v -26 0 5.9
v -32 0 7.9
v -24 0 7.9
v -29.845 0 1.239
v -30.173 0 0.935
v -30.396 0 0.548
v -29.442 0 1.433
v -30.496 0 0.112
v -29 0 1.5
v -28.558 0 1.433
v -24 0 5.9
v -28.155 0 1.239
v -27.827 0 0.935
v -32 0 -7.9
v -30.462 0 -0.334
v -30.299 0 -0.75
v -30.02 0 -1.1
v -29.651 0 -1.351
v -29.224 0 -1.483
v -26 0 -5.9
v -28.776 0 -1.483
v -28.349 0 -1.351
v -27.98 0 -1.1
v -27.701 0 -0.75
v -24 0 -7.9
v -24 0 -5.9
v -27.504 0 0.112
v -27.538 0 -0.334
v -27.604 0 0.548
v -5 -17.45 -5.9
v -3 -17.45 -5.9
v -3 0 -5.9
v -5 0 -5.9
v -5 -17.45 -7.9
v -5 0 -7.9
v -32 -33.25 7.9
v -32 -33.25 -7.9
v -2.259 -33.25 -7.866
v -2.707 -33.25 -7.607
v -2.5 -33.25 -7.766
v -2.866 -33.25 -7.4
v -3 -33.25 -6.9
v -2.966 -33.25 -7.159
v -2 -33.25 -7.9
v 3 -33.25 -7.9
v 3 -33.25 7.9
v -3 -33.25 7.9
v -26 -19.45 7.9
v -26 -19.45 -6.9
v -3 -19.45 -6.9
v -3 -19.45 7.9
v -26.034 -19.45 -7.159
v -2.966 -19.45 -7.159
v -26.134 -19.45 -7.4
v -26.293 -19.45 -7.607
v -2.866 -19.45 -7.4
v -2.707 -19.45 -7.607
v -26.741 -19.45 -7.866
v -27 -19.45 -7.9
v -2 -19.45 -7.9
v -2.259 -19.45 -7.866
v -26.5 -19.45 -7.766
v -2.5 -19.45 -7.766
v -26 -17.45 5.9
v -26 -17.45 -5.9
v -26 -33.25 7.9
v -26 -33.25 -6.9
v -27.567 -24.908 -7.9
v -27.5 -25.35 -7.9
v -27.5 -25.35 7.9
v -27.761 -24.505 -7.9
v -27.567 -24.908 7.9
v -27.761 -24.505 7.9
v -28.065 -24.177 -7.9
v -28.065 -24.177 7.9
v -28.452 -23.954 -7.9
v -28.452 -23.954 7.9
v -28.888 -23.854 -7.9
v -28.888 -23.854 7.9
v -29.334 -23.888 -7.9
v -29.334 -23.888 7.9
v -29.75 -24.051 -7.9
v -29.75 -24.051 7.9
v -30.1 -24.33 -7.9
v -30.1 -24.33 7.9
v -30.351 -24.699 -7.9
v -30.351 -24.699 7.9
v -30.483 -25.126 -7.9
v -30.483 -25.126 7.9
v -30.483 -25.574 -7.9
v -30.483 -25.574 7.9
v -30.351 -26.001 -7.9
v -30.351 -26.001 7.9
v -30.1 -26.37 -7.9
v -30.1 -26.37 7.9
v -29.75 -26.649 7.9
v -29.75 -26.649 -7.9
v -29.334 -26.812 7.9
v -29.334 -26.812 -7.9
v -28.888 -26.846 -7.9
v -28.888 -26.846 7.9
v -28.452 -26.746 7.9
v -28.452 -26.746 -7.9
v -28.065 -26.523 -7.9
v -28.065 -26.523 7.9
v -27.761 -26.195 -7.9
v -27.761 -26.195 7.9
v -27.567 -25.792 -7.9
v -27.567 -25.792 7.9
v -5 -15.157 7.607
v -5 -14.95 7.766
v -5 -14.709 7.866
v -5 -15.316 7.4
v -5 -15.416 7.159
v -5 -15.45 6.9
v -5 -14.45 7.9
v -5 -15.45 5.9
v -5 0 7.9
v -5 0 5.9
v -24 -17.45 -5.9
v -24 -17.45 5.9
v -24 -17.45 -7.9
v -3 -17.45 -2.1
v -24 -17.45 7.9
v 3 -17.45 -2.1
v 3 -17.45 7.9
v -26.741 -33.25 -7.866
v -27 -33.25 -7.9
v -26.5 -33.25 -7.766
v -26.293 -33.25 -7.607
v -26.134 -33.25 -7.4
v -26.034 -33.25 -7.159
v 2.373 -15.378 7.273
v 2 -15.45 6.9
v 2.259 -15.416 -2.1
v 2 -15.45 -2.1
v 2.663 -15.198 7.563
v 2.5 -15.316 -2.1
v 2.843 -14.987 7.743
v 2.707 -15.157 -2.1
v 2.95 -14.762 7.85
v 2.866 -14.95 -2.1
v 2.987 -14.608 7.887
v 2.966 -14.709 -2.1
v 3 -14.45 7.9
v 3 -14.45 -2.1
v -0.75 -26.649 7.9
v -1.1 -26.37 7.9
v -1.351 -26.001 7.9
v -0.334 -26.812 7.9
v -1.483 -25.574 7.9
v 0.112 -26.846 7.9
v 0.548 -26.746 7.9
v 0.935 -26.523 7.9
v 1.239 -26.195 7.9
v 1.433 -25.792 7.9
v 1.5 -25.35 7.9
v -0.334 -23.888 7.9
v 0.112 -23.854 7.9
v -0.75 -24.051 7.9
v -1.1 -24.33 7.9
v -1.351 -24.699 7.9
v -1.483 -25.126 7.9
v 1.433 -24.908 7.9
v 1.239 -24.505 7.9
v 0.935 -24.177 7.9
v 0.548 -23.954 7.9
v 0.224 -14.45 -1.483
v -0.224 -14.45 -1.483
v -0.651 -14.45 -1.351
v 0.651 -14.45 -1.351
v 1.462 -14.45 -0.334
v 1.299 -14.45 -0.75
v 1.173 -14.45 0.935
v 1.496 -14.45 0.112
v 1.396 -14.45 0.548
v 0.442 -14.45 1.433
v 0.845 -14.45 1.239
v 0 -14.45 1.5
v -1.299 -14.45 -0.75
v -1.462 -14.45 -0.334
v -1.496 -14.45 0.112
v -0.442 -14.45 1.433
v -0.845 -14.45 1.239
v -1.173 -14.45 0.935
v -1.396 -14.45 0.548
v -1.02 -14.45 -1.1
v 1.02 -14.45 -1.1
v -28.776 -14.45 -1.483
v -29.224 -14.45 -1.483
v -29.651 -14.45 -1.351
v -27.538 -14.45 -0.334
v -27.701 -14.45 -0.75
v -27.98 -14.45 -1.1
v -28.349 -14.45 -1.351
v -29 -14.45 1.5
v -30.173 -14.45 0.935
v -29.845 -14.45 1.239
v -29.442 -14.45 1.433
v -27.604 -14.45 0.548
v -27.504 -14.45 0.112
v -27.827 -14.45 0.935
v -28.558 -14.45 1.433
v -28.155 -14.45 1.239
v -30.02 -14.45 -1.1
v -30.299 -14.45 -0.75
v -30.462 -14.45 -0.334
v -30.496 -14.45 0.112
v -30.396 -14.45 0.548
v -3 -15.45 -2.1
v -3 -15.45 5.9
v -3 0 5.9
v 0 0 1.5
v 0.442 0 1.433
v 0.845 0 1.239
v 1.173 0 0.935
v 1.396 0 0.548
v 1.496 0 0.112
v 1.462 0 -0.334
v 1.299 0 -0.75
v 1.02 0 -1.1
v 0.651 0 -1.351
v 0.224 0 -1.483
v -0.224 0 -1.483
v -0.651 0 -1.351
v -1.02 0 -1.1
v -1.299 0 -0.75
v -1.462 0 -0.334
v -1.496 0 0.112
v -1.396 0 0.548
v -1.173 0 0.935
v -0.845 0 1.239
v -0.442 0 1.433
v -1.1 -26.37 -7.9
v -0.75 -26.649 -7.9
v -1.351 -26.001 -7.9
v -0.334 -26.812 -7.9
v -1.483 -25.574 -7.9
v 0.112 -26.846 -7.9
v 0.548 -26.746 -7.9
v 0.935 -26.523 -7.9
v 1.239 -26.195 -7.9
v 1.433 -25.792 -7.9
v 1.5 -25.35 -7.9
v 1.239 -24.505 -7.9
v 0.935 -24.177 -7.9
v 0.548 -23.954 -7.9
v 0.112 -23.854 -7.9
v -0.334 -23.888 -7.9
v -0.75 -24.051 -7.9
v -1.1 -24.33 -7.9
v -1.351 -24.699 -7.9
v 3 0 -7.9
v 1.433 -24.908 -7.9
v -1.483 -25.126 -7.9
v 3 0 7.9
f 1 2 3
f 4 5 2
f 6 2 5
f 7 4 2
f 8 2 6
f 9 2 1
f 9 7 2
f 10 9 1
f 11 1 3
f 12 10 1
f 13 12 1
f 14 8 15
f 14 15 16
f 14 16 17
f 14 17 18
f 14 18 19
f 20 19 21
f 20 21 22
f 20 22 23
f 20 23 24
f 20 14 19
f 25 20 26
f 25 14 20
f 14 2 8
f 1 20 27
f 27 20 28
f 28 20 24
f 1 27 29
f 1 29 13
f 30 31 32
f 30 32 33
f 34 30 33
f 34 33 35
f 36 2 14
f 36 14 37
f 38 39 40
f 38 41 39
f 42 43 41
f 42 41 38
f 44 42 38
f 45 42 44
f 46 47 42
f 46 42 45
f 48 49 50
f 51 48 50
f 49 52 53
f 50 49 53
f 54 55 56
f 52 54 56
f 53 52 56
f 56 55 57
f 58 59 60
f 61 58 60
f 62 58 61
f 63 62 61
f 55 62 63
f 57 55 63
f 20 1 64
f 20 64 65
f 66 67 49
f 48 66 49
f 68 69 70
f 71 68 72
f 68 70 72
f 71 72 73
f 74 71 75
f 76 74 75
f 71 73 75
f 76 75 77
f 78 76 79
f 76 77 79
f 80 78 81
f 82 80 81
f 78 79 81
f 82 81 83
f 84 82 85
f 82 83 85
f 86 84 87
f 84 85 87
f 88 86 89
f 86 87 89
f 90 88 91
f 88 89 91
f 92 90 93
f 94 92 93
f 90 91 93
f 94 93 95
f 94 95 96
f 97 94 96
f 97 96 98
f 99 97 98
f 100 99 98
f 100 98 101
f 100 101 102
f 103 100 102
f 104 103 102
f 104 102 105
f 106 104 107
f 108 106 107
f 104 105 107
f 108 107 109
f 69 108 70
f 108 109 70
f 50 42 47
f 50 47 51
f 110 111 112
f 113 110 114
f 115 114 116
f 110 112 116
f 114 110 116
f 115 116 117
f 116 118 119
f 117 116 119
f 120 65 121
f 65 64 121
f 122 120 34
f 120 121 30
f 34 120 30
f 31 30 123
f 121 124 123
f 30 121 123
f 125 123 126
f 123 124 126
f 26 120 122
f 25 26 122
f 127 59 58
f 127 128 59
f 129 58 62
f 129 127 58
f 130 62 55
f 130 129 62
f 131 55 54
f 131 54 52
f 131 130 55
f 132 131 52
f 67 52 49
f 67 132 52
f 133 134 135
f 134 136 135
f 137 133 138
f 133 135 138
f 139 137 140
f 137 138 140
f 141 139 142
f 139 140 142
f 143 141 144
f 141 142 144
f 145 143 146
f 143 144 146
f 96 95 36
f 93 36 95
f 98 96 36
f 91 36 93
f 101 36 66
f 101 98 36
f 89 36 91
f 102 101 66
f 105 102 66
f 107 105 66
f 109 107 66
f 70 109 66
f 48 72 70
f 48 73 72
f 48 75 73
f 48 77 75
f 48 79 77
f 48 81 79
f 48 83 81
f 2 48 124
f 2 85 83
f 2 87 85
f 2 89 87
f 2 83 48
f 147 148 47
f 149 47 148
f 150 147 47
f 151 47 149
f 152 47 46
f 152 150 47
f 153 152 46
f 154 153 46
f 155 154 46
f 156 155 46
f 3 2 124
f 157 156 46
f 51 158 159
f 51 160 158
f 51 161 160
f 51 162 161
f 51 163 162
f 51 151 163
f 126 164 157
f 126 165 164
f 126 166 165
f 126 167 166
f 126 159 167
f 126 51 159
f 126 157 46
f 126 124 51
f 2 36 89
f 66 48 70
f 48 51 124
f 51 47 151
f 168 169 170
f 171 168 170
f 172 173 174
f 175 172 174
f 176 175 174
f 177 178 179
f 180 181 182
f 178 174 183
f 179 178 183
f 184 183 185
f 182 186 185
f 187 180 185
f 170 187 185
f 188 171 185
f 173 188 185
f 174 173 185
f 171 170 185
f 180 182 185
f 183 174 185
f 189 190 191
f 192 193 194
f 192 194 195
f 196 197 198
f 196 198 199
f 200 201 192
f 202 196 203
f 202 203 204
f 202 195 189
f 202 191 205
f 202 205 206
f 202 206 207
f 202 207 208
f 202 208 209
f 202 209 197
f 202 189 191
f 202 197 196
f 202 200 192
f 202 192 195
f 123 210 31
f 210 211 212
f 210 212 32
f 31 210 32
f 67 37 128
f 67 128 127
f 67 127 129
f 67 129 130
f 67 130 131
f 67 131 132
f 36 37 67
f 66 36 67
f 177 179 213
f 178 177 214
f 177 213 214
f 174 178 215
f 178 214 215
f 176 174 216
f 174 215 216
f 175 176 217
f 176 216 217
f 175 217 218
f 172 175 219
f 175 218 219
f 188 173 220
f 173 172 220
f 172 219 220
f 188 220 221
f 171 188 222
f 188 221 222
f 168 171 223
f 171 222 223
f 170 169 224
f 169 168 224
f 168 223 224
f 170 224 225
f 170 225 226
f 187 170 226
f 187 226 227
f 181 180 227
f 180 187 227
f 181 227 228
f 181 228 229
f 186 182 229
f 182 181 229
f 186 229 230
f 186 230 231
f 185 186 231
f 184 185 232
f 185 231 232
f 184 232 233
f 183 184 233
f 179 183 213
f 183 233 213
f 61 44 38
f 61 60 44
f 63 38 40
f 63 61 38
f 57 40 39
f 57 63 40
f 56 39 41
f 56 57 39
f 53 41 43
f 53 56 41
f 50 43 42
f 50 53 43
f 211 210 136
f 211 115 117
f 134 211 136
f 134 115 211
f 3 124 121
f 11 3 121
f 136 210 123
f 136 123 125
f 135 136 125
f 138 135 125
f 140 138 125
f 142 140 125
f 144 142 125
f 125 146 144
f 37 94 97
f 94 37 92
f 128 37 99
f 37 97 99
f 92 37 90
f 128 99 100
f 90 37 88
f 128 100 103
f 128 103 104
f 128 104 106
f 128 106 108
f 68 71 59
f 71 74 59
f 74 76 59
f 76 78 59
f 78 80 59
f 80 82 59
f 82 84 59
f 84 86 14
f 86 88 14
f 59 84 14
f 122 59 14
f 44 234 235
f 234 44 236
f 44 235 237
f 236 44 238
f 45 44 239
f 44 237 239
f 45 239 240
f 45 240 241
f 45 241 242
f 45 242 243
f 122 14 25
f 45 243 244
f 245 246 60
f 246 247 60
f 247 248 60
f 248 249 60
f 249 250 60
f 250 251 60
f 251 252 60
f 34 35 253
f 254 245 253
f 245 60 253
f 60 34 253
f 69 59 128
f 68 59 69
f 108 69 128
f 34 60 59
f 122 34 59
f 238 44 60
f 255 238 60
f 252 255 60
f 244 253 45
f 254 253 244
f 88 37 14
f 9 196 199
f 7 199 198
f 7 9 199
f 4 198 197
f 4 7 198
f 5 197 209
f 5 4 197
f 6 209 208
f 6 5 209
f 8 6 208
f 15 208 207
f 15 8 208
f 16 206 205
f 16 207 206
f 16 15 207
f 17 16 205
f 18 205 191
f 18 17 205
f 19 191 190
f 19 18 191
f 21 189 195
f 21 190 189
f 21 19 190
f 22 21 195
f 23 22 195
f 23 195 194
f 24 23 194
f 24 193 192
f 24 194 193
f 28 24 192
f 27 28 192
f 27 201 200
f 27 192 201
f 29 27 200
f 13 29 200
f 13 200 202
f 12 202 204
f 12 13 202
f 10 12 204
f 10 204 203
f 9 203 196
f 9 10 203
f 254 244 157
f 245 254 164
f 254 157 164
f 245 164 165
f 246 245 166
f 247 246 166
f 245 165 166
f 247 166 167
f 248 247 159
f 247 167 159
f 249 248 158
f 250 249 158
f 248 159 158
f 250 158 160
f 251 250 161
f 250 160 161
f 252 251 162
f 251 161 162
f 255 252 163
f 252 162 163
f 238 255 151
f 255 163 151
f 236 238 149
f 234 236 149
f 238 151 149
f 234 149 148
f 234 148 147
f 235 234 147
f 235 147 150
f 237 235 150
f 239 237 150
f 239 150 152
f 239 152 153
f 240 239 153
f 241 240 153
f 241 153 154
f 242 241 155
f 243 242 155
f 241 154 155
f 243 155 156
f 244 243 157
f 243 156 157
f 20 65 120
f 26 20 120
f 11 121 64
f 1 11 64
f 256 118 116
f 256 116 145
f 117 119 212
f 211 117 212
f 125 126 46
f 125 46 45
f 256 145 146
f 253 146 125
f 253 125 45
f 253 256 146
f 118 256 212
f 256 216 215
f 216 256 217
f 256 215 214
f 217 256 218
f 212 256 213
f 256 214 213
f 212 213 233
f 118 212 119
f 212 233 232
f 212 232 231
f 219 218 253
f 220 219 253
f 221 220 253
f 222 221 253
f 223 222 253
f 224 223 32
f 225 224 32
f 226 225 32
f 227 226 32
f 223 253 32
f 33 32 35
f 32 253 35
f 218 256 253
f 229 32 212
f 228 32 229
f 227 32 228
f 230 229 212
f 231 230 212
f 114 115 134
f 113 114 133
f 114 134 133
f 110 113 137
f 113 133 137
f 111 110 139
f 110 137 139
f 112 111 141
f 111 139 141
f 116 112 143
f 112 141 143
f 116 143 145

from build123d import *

# Parameters (mm, degrees)
SKETCH1_R           = 1.5
BOSS_EXTRUDE1_DEPTH = 19.45
BOSS_EXTRUDE2_START = -5
SKETCH2_R           = 1.5
BOSS_EXTRUDE2_DEPTH = 5
SKETCH5_W           = 35
SKETCH5_H           = 15.8
BOSS_EXTRUDE3_DEPTH = 2
SKETCH6_R           = 1.5
BOSS_EXTRUDE4_DEPTH = 15.8
SKETCH7_W           = 19
SKETCH7_H           = 2
BOSS_EXTRUDE5_DEPTH = 15.8
SKETCH8_W           = 8
SKETCH8_H           = 2
CUT_EXTRUDE1_DEPTH  = 10
FILLET1_R           = 1
SKETCH9_W           = 23
SKETCH9_H           = 2
CUT_EXTRUDE2_DEPTH  = 44
FILLET2_R           = 1


with BuildPart() as part:
    # Sketch1 → Boss-Extrude1 (new body)
    with BuildSketch(Plane(origin=(0, 0, 0), x_dir=(1, 0, 0), z_dir=(0, 1, 0))):
        Polygon((-5, 7.9), (3, 7.9), (3, 5.9), (3, -5.9), (3, -7.9), (-5, -7.9), (-5, -5.9), (-3, -5.9), (-3, 5.9), (-5, 5.9), align=None)
        with Locations(Location((0, 0, 0), (0, 0, 270))):
            Circle(SKETCH1_R, mode=Mode.SUBTRACT)
    extrude(amount=-BOSS_EXTRUDE1_DEPTH)

    # Sketch2 → Boss-Extrude2 (add)
    with BuildSketch(Plane.XZ.offset(19.45).offset(BOSS_EXTRUDE2_START)):
        with Locations(Location((0, 0, 0), (0, 0, 90))):
            Circle(SKETCH2_R)
    extrude(amount=BOSS_EXTRUDE2_DEPTH)


with BuildPart() as body_2:
    # Mirror2: mirrored copy
    add(part.part.mirror(Plane.ZY.offset(14.5)))


with BuildPart() as part_1:
    add(part.part)

    add(body_2.part)  # Boss-Extrude3 merges body 2
    # Sketch5 → Boss-Extrude3 (add)
    with BuildSketch(Plane.XZ.offset(19.45)):
        with Locations((-14.5, 0)):
            Rectangle(SKETCH5_W, SKETCH5_H)
    extrude(amount=-BOSS_EXTRUDE3_DEPTH)

    # Sketch6 → Boss-Extrude4 (add)
    # profile 1 of 2: a face of its own
    with BuildSketch(Plane.XY.offset(7.9)):
        Polygon((-26, -31.25), (-26, -19.45), (-32, -19.45), (-32, -31.25), (-32, -33.25), (-24, -33.25), (-24, -31.25), align=None)
        with Locations((-29, -25.35)):
            Circle(SKETCH6_R, mode=Mode.SUBTRACT)
    # profile 2 of 2: a face of its own
    with BuildSketch(Plane.XY.offset(7.9)):
        Polygon((-3, -19.45), (-3, -31.25), (-5, -31.25), (-5, -33.25), (3, -33.25), (3, -31.25), (3, -19.45), align=None)
        with Locations((0, -25.35)):
            Circle(SKETCH6_R, mode=Mode.SUBTRACT)
    extrude(amount=-BOSS_EXTRUDE4_DEPTH)

    # Sketch7 → Boss-Extrude5 (add)
    with BuildSketch(Plane.XY.offset(7.9)):
        with Locations((-14.5, -32.25)):
            Rectangle(SKETCH7_W, SKETCH7_H)
    extrude(amount=-BOSS_EXTRUDE5_DEPTH)

    # Sketch8 → Cut-Extrude1 (cut)
    with BuildSketch(Plane.XY.offset(7.9)):
        with Locations((-1, -16.45)):
            Rectangle(SKETCH8_W, SKETCH8_H)
    extrude(amount=-CUT_EXTRUDE1_DEPTH, mode=Mode.SUBTRACT)

    # Fillet1
    fillet1_edges = [part_1.edges().sort_by_distance(p)[0] for p in [
        (3, -15.45, 2.9),
        (-1, -15.45, 7.9),
    ]]
    fillet(fillet1_edges, radius=FILLET1_R)

    # Sketch9 → Cut-Extrude2 (cut)
    with BuildSketch(Plane.XY.offset(7.9)):
        with Locations((-14.5, -32.25)):
            Rectangle(SKETCH9_W, SKETCH9_H)
    extrude(amount=-CUT_EXTRUDE2_DEPTH, mode=Mode.SUBTRACT)

    # Fillet2
    fillet2_edges = [part_1.edges().sort_by_distance(p)[0] for p in [
        (-26, -26.35, -7.9),
        (-3, -26.35, -7.9),
    ]]
    fillet(fillet2_edges, radius=FILLET2_R)


solid = part_1.part
